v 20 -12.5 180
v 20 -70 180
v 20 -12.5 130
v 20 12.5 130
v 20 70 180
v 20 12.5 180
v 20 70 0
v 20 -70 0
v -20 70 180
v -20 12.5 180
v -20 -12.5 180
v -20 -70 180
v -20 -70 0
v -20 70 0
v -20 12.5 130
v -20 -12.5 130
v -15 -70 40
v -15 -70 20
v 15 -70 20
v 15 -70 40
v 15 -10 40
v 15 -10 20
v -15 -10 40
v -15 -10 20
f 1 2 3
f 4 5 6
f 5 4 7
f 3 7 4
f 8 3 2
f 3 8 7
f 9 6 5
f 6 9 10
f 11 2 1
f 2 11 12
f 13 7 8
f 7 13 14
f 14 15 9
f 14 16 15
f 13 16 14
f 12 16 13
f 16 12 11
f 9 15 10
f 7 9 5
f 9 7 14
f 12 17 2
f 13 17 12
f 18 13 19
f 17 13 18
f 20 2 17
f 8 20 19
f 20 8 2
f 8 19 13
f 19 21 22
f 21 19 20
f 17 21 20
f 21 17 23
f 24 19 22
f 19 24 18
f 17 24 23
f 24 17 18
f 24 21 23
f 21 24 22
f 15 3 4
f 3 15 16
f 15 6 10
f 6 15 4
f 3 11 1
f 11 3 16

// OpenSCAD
// Ski vise


// The vise is basically very simple, and is a cube that is hollowed out.
// These are the basic dimensions for this cube
vise_height = 180;
vise_width = 40;
// This should/could be adjusted to accommodate wider skis
// 140 is very wide. You should probably not go lower than 80
vise_depth = 140;

// We need a cutout to allow for a clamp, for clamping to a table.
// This should match the clamp available for you
// Offset from the table you mount to
clamp_offset = 20;
clamp_height = 20;
clamp_width = 30;
clamp_depth = 60; // This could be a percent?

// This is for the slot to place the ski, when you need to work the edges
// This is always centered, but do have a depth and height
slot_height = 50;
slot_depth = 25;

// This is to avoid breaking the manifold
pad = 0.1;

// The major part, everything else is cut from this
module base() {
    // Place centered in x,y
    translate( [0,0,vise_height / 2.0]) {
        cube([vise_width, vise_depth, vise_height], center = true);
    };
}

// The place to clamp the vise to the table
module clamp_hollower() {
    // Translate to match front of main/base, and offset
    translate( [-clamp_width/2.0, -vise_depth/2.0 - pad, clamp_offset] ) {
        cube([clamp_width, clamp_depth+pad, clamp_height]);
    };
}

// The slot to place the ski in when working on the edge
module slot_hollower() {
    translate( [-vise_width/2.0 - pad, -slot_depth/2.0, vise_height - slot_height ] ) {
        cube([vise_width + 2*pad, slot_depth, slot_height + pad] );
    }
}

// For now, main.
difference() {
    base();
    # clamp_hollower();
    # slot_hollower();
}
    
